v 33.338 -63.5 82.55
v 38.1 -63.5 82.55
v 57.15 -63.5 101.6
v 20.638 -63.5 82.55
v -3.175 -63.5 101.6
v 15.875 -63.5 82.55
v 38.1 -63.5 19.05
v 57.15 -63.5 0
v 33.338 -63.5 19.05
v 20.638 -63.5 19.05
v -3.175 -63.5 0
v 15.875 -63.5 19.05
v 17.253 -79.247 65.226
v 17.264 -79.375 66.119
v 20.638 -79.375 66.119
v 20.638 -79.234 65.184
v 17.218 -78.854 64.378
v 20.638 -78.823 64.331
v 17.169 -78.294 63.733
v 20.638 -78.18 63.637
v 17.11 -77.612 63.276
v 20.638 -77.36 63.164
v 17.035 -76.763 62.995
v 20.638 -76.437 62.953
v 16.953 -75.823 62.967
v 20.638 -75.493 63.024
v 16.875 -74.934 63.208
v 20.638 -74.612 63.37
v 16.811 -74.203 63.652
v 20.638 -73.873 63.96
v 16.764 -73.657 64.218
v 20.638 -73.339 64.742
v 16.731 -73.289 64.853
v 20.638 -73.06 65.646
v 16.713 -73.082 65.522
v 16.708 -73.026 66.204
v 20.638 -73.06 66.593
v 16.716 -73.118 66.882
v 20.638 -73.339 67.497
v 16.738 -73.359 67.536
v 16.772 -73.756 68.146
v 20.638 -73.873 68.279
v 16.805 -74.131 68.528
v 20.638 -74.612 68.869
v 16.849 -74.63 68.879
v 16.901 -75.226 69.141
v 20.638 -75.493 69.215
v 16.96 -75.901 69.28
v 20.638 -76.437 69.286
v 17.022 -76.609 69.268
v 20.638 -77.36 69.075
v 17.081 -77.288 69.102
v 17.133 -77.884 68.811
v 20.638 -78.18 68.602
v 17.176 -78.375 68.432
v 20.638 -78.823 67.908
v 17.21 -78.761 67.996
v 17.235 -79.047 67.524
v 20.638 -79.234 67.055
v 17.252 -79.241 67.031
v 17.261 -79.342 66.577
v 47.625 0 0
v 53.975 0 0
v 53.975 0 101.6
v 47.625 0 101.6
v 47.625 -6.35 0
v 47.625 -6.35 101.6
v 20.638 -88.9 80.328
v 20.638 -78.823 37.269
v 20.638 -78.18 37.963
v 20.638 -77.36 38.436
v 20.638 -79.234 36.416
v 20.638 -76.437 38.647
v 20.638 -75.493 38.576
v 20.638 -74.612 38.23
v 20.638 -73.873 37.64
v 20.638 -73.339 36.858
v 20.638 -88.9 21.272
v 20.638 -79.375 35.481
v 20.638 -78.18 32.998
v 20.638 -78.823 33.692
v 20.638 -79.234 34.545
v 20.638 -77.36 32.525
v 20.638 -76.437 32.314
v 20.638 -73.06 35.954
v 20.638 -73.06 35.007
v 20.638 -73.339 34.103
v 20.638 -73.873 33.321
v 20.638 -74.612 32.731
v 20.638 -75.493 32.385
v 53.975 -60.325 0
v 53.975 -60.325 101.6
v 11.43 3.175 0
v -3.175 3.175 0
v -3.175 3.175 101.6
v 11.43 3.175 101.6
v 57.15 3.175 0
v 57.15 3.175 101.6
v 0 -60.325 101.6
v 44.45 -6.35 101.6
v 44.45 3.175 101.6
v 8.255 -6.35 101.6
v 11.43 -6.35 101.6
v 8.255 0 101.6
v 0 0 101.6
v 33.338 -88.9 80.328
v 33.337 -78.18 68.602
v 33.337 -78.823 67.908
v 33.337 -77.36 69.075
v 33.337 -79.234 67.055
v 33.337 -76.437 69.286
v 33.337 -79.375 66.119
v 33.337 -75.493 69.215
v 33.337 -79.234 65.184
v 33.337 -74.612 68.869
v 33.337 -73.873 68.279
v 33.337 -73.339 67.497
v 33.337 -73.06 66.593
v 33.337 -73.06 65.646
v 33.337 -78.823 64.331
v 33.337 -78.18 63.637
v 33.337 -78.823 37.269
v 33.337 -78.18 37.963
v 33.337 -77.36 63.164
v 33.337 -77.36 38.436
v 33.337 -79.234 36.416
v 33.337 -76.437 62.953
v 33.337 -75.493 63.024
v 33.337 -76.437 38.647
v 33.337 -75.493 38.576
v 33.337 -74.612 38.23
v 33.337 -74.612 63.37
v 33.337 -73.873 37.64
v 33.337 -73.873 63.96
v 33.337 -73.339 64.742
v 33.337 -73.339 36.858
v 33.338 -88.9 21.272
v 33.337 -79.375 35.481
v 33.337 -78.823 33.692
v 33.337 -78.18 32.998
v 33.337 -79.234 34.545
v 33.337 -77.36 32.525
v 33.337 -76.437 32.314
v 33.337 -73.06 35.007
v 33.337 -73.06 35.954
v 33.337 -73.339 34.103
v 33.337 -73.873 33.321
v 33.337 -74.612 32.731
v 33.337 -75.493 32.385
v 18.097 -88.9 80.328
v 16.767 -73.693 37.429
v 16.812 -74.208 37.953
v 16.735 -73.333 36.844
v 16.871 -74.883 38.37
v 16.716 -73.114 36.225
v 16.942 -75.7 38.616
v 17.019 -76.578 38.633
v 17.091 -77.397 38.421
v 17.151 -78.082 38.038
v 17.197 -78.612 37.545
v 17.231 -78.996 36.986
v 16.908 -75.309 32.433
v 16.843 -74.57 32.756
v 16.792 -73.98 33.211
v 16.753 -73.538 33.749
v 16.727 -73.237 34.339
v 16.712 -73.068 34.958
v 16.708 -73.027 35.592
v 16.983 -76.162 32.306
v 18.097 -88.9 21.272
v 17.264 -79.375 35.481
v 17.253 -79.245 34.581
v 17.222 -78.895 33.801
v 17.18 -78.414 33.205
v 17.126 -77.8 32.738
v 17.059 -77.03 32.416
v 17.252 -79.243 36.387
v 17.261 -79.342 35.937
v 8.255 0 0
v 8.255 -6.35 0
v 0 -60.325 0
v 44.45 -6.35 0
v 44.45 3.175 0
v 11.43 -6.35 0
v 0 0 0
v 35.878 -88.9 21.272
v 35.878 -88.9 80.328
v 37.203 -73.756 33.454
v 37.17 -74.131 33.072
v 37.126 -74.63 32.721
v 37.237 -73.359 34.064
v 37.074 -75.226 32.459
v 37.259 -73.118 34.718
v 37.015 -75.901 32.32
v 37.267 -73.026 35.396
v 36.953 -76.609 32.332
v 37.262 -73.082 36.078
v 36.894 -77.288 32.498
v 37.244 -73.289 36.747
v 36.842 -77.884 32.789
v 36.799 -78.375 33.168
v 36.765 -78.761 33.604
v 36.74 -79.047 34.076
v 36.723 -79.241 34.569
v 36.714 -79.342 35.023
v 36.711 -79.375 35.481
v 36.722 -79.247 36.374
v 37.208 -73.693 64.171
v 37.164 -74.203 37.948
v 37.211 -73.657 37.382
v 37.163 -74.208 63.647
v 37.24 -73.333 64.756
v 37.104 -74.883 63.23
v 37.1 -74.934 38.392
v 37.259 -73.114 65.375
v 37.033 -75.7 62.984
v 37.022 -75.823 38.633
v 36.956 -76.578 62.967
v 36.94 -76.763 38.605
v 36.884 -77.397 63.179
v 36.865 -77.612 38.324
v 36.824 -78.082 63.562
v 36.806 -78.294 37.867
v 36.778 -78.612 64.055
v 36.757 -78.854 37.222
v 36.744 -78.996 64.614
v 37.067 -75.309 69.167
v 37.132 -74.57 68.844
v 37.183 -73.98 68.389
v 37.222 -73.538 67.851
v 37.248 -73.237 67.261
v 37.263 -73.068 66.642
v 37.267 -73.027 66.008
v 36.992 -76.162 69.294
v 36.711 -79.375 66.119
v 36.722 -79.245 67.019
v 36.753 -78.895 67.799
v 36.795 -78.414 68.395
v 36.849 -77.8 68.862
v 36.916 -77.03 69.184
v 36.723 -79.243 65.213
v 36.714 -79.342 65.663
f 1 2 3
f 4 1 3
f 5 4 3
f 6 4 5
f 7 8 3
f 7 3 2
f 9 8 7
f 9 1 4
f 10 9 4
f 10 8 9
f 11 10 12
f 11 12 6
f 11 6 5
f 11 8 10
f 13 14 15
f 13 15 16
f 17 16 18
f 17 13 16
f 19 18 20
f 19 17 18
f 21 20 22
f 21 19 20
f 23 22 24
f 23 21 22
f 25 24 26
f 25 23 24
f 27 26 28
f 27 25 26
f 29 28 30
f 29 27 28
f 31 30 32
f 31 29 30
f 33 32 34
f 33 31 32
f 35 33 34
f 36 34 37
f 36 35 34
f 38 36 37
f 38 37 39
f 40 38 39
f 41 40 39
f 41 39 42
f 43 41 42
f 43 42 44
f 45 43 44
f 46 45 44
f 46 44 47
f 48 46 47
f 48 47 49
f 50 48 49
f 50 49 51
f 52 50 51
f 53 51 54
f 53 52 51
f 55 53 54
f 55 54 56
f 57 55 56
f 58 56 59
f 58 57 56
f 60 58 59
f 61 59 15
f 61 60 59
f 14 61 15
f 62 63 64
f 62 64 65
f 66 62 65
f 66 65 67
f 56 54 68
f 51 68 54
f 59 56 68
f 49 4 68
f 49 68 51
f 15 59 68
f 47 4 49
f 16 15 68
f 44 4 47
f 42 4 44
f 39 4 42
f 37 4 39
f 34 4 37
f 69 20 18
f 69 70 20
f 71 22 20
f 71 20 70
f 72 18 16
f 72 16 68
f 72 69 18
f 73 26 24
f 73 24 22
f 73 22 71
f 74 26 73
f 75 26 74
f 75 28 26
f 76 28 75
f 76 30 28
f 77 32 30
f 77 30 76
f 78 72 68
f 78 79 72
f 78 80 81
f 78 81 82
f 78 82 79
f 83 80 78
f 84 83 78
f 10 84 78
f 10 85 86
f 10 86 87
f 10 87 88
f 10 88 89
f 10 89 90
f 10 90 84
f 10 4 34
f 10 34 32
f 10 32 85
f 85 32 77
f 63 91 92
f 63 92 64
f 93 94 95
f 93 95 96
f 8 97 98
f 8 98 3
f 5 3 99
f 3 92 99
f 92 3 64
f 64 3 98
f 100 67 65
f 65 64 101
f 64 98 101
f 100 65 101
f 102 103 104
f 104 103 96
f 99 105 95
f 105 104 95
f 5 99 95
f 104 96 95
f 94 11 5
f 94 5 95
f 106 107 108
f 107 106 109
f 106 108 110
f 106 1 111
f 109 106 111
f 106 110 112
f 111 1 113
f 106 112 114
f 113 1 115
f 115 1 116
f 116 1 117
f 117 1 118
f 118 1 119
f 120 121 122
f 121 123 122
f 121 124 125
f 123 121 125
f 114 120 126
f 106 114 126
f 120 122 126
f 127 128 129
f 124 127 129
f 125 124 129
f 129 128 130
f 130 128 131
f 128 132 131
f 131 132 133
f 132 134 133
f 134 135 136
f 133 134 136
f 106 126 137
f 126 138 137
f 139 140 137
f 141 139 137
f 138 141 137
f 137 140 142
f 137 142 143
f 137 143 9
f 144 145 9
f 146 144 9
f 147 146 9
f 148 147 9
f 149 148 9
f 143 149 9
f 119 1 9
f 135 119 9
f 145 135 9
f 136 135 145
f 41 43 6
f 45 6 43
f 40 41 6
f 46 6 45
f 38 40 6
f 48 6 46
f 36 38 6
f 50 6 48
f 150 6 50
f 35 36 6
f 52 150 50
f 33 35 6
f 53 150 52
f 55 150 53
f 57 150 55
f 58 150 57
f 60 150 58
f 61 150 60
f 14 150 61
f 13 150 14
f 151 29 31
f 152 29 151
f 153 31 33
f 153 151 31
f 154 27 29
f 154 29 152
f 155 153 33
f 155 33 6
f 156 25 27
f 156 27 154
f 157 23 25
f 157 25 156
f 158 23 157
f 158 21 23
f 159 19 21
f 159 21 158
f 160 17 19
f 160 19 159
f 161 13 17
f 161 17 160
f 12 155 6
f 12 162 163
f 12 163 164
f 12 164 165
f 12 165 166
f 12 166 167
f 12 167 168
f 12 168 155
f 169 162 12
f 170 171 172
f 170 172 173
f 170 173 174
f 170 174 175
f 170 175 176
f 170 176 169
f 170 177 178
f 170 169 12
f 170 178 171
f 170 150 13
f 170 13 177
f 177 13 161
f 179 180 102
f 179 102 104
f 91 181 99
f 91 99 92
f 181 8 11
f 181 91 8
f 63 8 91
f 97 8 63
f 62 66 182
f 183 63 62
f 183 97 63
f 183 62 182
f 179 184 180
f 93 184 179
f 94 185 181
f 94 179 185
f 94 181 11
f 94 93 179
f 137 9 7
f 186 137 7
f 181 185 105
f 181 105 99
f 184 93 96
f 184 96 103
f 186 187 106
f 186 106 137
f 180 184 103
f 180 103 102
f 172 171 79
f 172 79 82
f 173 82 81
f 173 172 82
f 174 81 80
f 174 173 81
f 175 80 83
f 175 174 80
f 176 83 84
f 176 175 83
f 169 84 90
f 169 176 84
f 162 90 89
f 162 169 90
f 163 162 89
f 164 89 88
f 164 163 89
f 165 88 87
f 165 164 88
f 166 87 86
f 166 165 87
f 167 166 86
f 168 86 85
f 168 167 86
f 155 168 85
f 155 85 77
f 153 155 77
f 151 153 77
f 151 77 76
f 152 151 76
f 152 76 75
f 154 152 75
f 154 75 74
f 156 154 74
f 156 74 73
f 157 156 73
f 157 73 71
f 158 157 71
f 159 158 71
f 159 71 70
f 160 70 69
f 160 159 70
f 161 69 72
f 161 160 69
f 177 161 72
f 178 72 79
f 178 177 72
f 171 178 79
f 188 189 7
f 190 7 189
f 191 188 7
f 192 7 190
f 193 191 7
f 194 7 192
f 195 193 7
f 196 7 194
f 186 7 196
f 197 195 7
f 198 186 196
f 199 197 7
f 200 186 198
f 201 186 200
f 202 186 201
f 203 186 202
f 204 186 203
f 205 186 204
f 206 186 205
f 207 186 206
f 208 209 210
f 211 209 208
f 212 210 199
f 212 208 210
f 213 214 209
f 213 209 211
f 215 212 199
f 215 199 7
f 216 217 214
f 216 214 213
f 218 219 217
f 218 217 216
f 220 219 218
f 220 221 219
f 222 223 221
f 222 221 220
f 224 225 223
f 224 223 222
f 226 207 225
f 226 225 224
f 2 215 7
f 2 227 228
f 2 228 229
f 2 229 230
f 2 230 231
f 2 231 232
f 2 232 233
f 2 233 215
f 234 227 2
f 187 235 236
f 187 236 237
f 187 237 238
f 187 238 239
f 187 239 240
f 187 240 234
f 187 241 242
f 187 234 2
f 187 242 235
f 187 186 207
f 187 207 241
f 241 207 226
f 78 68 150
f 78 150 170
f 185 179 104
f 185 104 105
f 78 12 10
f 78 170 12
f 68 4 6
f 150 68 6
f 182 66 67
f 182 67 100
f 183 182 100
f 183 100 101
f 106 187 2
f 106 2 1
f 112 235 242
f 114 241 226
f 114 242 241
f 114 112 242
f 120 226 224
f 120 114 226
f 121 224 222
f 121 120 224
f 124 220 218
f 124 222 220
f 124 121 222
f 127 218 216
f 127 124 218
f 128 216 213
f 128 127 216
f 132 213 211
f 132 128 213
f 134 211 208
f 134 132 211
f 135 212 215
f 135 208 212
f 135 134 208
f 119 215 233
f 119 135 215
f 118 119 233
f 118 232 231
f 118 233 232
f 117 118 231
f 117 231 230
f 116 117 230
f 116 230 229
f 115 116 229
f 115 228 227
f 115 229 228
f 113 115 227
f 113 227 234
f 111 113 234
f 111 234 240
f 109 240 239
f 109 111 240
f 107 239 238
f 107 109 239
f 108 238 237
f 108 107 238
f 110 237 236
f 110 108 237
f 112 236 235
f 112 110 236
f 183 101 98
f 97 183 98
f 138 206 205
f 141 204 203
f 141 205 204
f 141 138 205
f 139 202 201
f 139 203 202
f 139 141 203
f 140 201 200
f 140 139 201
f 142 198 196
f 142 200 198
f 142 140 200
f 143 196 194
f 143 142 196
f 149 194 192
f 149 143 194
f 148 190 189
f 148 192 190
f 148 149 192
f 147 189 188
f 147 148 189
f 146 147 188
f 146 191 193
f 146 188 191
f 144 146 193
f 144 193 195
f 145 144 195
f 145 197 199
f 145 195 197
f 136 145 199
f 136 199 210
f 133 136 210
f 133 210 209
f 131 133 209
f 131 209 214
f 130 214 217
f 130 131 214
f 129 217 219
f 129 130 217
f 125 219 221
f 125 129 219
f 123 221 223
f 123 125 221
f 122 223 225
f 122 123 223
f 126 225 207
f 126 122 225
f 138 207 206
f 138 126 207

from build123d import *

# Parameters (mm, degrees)
BOSS_EXTRUDE1_DEPTH     = 101.6
SKETCH2_W               = 22.225
SKETCH2_H               = 63.5
BOSS_EXTRUDE2_DEPTH     = 25.4
BOSS_EXTRUDE2_TAPER     = 5
SKETCH2_3_W             = 12.7
SKETCH2_3_H             = 63.5
CUT_EXTRUDE1_DEPTH      = 25.4
CUT_EXTRUDE2_DEPTH      = 140.85325407
CUT_EXTRUDE2_DEPTH_BACK = 140.85325407
SKETCH3_R               = 3.175


with BuildPart() as part:
    # Sketch1 → Boss-Extrude1 (new body)
    with BuildSketch(Plane.XY):
        Polygon((0, 0), (0, -60.325), (53.975, -60.325), (53.975, 0), (47.625, 0), (47.625, -6.35), (44.45, -6.35), (44.45, 3.175), (57.15, 3.175), (57.15, -63.5), (-3.175, -63.5), (-3.175, 3.175), (11.43, 3.175), (11.43, -6.35), (8.255, -6.35), (8.255, 0), align=None)
    extrude(amount=BOSS_EXTRUDE1_DEPTH)

    # Sketch2 → Boss-Extrude2 (add)
    with BuildSketch(Plane(origin=(0, -63.5, 0), x_dir=(-1, 0, 0), z_dir=(0, -1, 0))):
        with Locations((-26.9875, -50.8)):
            Rectangle(SKETCH2_W, SKETCH2_H)
    extrude(amount=BOSS_EXTRUDE2_DEPTH, taper=BOSS_EXTRUDE2_TAPER)

    # Sketch2<3> → Cut-Extrude1 (cut)
    with BuildSketch(Plane(origin=(0, -63.5, 0), x_dir=(-1, 0, 0), z_dir=(0, -1, 0))):
        with Locations((-26.9875, -50.8)):
            Rectangle(SKETCH2_3_W, SKETCH2_3_H)
    extrude(amount=CUT_EXTRUDE1_DEPTH, mode=Mode.SUBTRACT)

    # Sketch3 → Cut-Extrude2 (cut, two sides: drawn at the far end of the back side and taken through both)
    with BuildSketch(Plane(origin=(20.6375, 0, 0), x_dir=(0, 0, -1), z_dir=(1, 0, 0)).offset(-CUT_EXTRUDE2_DEPTH_BACK)):
        with Locations(Location((-66.119446987, -76.2, 0), (0, 0, 270))):
            Circle(SKETCH3_R)
        with Locations(Location((-35.480553013, -76.2, 0), (0, 0, 270))):
            Circle(SKETCH3_R)
    extrude(amount=CUT_EXTRUDE2_DEPTH + CUT_EXTRUDE2_DEPTH_BACK, mode=Mode.SUBTRACT)


solid = part.part
